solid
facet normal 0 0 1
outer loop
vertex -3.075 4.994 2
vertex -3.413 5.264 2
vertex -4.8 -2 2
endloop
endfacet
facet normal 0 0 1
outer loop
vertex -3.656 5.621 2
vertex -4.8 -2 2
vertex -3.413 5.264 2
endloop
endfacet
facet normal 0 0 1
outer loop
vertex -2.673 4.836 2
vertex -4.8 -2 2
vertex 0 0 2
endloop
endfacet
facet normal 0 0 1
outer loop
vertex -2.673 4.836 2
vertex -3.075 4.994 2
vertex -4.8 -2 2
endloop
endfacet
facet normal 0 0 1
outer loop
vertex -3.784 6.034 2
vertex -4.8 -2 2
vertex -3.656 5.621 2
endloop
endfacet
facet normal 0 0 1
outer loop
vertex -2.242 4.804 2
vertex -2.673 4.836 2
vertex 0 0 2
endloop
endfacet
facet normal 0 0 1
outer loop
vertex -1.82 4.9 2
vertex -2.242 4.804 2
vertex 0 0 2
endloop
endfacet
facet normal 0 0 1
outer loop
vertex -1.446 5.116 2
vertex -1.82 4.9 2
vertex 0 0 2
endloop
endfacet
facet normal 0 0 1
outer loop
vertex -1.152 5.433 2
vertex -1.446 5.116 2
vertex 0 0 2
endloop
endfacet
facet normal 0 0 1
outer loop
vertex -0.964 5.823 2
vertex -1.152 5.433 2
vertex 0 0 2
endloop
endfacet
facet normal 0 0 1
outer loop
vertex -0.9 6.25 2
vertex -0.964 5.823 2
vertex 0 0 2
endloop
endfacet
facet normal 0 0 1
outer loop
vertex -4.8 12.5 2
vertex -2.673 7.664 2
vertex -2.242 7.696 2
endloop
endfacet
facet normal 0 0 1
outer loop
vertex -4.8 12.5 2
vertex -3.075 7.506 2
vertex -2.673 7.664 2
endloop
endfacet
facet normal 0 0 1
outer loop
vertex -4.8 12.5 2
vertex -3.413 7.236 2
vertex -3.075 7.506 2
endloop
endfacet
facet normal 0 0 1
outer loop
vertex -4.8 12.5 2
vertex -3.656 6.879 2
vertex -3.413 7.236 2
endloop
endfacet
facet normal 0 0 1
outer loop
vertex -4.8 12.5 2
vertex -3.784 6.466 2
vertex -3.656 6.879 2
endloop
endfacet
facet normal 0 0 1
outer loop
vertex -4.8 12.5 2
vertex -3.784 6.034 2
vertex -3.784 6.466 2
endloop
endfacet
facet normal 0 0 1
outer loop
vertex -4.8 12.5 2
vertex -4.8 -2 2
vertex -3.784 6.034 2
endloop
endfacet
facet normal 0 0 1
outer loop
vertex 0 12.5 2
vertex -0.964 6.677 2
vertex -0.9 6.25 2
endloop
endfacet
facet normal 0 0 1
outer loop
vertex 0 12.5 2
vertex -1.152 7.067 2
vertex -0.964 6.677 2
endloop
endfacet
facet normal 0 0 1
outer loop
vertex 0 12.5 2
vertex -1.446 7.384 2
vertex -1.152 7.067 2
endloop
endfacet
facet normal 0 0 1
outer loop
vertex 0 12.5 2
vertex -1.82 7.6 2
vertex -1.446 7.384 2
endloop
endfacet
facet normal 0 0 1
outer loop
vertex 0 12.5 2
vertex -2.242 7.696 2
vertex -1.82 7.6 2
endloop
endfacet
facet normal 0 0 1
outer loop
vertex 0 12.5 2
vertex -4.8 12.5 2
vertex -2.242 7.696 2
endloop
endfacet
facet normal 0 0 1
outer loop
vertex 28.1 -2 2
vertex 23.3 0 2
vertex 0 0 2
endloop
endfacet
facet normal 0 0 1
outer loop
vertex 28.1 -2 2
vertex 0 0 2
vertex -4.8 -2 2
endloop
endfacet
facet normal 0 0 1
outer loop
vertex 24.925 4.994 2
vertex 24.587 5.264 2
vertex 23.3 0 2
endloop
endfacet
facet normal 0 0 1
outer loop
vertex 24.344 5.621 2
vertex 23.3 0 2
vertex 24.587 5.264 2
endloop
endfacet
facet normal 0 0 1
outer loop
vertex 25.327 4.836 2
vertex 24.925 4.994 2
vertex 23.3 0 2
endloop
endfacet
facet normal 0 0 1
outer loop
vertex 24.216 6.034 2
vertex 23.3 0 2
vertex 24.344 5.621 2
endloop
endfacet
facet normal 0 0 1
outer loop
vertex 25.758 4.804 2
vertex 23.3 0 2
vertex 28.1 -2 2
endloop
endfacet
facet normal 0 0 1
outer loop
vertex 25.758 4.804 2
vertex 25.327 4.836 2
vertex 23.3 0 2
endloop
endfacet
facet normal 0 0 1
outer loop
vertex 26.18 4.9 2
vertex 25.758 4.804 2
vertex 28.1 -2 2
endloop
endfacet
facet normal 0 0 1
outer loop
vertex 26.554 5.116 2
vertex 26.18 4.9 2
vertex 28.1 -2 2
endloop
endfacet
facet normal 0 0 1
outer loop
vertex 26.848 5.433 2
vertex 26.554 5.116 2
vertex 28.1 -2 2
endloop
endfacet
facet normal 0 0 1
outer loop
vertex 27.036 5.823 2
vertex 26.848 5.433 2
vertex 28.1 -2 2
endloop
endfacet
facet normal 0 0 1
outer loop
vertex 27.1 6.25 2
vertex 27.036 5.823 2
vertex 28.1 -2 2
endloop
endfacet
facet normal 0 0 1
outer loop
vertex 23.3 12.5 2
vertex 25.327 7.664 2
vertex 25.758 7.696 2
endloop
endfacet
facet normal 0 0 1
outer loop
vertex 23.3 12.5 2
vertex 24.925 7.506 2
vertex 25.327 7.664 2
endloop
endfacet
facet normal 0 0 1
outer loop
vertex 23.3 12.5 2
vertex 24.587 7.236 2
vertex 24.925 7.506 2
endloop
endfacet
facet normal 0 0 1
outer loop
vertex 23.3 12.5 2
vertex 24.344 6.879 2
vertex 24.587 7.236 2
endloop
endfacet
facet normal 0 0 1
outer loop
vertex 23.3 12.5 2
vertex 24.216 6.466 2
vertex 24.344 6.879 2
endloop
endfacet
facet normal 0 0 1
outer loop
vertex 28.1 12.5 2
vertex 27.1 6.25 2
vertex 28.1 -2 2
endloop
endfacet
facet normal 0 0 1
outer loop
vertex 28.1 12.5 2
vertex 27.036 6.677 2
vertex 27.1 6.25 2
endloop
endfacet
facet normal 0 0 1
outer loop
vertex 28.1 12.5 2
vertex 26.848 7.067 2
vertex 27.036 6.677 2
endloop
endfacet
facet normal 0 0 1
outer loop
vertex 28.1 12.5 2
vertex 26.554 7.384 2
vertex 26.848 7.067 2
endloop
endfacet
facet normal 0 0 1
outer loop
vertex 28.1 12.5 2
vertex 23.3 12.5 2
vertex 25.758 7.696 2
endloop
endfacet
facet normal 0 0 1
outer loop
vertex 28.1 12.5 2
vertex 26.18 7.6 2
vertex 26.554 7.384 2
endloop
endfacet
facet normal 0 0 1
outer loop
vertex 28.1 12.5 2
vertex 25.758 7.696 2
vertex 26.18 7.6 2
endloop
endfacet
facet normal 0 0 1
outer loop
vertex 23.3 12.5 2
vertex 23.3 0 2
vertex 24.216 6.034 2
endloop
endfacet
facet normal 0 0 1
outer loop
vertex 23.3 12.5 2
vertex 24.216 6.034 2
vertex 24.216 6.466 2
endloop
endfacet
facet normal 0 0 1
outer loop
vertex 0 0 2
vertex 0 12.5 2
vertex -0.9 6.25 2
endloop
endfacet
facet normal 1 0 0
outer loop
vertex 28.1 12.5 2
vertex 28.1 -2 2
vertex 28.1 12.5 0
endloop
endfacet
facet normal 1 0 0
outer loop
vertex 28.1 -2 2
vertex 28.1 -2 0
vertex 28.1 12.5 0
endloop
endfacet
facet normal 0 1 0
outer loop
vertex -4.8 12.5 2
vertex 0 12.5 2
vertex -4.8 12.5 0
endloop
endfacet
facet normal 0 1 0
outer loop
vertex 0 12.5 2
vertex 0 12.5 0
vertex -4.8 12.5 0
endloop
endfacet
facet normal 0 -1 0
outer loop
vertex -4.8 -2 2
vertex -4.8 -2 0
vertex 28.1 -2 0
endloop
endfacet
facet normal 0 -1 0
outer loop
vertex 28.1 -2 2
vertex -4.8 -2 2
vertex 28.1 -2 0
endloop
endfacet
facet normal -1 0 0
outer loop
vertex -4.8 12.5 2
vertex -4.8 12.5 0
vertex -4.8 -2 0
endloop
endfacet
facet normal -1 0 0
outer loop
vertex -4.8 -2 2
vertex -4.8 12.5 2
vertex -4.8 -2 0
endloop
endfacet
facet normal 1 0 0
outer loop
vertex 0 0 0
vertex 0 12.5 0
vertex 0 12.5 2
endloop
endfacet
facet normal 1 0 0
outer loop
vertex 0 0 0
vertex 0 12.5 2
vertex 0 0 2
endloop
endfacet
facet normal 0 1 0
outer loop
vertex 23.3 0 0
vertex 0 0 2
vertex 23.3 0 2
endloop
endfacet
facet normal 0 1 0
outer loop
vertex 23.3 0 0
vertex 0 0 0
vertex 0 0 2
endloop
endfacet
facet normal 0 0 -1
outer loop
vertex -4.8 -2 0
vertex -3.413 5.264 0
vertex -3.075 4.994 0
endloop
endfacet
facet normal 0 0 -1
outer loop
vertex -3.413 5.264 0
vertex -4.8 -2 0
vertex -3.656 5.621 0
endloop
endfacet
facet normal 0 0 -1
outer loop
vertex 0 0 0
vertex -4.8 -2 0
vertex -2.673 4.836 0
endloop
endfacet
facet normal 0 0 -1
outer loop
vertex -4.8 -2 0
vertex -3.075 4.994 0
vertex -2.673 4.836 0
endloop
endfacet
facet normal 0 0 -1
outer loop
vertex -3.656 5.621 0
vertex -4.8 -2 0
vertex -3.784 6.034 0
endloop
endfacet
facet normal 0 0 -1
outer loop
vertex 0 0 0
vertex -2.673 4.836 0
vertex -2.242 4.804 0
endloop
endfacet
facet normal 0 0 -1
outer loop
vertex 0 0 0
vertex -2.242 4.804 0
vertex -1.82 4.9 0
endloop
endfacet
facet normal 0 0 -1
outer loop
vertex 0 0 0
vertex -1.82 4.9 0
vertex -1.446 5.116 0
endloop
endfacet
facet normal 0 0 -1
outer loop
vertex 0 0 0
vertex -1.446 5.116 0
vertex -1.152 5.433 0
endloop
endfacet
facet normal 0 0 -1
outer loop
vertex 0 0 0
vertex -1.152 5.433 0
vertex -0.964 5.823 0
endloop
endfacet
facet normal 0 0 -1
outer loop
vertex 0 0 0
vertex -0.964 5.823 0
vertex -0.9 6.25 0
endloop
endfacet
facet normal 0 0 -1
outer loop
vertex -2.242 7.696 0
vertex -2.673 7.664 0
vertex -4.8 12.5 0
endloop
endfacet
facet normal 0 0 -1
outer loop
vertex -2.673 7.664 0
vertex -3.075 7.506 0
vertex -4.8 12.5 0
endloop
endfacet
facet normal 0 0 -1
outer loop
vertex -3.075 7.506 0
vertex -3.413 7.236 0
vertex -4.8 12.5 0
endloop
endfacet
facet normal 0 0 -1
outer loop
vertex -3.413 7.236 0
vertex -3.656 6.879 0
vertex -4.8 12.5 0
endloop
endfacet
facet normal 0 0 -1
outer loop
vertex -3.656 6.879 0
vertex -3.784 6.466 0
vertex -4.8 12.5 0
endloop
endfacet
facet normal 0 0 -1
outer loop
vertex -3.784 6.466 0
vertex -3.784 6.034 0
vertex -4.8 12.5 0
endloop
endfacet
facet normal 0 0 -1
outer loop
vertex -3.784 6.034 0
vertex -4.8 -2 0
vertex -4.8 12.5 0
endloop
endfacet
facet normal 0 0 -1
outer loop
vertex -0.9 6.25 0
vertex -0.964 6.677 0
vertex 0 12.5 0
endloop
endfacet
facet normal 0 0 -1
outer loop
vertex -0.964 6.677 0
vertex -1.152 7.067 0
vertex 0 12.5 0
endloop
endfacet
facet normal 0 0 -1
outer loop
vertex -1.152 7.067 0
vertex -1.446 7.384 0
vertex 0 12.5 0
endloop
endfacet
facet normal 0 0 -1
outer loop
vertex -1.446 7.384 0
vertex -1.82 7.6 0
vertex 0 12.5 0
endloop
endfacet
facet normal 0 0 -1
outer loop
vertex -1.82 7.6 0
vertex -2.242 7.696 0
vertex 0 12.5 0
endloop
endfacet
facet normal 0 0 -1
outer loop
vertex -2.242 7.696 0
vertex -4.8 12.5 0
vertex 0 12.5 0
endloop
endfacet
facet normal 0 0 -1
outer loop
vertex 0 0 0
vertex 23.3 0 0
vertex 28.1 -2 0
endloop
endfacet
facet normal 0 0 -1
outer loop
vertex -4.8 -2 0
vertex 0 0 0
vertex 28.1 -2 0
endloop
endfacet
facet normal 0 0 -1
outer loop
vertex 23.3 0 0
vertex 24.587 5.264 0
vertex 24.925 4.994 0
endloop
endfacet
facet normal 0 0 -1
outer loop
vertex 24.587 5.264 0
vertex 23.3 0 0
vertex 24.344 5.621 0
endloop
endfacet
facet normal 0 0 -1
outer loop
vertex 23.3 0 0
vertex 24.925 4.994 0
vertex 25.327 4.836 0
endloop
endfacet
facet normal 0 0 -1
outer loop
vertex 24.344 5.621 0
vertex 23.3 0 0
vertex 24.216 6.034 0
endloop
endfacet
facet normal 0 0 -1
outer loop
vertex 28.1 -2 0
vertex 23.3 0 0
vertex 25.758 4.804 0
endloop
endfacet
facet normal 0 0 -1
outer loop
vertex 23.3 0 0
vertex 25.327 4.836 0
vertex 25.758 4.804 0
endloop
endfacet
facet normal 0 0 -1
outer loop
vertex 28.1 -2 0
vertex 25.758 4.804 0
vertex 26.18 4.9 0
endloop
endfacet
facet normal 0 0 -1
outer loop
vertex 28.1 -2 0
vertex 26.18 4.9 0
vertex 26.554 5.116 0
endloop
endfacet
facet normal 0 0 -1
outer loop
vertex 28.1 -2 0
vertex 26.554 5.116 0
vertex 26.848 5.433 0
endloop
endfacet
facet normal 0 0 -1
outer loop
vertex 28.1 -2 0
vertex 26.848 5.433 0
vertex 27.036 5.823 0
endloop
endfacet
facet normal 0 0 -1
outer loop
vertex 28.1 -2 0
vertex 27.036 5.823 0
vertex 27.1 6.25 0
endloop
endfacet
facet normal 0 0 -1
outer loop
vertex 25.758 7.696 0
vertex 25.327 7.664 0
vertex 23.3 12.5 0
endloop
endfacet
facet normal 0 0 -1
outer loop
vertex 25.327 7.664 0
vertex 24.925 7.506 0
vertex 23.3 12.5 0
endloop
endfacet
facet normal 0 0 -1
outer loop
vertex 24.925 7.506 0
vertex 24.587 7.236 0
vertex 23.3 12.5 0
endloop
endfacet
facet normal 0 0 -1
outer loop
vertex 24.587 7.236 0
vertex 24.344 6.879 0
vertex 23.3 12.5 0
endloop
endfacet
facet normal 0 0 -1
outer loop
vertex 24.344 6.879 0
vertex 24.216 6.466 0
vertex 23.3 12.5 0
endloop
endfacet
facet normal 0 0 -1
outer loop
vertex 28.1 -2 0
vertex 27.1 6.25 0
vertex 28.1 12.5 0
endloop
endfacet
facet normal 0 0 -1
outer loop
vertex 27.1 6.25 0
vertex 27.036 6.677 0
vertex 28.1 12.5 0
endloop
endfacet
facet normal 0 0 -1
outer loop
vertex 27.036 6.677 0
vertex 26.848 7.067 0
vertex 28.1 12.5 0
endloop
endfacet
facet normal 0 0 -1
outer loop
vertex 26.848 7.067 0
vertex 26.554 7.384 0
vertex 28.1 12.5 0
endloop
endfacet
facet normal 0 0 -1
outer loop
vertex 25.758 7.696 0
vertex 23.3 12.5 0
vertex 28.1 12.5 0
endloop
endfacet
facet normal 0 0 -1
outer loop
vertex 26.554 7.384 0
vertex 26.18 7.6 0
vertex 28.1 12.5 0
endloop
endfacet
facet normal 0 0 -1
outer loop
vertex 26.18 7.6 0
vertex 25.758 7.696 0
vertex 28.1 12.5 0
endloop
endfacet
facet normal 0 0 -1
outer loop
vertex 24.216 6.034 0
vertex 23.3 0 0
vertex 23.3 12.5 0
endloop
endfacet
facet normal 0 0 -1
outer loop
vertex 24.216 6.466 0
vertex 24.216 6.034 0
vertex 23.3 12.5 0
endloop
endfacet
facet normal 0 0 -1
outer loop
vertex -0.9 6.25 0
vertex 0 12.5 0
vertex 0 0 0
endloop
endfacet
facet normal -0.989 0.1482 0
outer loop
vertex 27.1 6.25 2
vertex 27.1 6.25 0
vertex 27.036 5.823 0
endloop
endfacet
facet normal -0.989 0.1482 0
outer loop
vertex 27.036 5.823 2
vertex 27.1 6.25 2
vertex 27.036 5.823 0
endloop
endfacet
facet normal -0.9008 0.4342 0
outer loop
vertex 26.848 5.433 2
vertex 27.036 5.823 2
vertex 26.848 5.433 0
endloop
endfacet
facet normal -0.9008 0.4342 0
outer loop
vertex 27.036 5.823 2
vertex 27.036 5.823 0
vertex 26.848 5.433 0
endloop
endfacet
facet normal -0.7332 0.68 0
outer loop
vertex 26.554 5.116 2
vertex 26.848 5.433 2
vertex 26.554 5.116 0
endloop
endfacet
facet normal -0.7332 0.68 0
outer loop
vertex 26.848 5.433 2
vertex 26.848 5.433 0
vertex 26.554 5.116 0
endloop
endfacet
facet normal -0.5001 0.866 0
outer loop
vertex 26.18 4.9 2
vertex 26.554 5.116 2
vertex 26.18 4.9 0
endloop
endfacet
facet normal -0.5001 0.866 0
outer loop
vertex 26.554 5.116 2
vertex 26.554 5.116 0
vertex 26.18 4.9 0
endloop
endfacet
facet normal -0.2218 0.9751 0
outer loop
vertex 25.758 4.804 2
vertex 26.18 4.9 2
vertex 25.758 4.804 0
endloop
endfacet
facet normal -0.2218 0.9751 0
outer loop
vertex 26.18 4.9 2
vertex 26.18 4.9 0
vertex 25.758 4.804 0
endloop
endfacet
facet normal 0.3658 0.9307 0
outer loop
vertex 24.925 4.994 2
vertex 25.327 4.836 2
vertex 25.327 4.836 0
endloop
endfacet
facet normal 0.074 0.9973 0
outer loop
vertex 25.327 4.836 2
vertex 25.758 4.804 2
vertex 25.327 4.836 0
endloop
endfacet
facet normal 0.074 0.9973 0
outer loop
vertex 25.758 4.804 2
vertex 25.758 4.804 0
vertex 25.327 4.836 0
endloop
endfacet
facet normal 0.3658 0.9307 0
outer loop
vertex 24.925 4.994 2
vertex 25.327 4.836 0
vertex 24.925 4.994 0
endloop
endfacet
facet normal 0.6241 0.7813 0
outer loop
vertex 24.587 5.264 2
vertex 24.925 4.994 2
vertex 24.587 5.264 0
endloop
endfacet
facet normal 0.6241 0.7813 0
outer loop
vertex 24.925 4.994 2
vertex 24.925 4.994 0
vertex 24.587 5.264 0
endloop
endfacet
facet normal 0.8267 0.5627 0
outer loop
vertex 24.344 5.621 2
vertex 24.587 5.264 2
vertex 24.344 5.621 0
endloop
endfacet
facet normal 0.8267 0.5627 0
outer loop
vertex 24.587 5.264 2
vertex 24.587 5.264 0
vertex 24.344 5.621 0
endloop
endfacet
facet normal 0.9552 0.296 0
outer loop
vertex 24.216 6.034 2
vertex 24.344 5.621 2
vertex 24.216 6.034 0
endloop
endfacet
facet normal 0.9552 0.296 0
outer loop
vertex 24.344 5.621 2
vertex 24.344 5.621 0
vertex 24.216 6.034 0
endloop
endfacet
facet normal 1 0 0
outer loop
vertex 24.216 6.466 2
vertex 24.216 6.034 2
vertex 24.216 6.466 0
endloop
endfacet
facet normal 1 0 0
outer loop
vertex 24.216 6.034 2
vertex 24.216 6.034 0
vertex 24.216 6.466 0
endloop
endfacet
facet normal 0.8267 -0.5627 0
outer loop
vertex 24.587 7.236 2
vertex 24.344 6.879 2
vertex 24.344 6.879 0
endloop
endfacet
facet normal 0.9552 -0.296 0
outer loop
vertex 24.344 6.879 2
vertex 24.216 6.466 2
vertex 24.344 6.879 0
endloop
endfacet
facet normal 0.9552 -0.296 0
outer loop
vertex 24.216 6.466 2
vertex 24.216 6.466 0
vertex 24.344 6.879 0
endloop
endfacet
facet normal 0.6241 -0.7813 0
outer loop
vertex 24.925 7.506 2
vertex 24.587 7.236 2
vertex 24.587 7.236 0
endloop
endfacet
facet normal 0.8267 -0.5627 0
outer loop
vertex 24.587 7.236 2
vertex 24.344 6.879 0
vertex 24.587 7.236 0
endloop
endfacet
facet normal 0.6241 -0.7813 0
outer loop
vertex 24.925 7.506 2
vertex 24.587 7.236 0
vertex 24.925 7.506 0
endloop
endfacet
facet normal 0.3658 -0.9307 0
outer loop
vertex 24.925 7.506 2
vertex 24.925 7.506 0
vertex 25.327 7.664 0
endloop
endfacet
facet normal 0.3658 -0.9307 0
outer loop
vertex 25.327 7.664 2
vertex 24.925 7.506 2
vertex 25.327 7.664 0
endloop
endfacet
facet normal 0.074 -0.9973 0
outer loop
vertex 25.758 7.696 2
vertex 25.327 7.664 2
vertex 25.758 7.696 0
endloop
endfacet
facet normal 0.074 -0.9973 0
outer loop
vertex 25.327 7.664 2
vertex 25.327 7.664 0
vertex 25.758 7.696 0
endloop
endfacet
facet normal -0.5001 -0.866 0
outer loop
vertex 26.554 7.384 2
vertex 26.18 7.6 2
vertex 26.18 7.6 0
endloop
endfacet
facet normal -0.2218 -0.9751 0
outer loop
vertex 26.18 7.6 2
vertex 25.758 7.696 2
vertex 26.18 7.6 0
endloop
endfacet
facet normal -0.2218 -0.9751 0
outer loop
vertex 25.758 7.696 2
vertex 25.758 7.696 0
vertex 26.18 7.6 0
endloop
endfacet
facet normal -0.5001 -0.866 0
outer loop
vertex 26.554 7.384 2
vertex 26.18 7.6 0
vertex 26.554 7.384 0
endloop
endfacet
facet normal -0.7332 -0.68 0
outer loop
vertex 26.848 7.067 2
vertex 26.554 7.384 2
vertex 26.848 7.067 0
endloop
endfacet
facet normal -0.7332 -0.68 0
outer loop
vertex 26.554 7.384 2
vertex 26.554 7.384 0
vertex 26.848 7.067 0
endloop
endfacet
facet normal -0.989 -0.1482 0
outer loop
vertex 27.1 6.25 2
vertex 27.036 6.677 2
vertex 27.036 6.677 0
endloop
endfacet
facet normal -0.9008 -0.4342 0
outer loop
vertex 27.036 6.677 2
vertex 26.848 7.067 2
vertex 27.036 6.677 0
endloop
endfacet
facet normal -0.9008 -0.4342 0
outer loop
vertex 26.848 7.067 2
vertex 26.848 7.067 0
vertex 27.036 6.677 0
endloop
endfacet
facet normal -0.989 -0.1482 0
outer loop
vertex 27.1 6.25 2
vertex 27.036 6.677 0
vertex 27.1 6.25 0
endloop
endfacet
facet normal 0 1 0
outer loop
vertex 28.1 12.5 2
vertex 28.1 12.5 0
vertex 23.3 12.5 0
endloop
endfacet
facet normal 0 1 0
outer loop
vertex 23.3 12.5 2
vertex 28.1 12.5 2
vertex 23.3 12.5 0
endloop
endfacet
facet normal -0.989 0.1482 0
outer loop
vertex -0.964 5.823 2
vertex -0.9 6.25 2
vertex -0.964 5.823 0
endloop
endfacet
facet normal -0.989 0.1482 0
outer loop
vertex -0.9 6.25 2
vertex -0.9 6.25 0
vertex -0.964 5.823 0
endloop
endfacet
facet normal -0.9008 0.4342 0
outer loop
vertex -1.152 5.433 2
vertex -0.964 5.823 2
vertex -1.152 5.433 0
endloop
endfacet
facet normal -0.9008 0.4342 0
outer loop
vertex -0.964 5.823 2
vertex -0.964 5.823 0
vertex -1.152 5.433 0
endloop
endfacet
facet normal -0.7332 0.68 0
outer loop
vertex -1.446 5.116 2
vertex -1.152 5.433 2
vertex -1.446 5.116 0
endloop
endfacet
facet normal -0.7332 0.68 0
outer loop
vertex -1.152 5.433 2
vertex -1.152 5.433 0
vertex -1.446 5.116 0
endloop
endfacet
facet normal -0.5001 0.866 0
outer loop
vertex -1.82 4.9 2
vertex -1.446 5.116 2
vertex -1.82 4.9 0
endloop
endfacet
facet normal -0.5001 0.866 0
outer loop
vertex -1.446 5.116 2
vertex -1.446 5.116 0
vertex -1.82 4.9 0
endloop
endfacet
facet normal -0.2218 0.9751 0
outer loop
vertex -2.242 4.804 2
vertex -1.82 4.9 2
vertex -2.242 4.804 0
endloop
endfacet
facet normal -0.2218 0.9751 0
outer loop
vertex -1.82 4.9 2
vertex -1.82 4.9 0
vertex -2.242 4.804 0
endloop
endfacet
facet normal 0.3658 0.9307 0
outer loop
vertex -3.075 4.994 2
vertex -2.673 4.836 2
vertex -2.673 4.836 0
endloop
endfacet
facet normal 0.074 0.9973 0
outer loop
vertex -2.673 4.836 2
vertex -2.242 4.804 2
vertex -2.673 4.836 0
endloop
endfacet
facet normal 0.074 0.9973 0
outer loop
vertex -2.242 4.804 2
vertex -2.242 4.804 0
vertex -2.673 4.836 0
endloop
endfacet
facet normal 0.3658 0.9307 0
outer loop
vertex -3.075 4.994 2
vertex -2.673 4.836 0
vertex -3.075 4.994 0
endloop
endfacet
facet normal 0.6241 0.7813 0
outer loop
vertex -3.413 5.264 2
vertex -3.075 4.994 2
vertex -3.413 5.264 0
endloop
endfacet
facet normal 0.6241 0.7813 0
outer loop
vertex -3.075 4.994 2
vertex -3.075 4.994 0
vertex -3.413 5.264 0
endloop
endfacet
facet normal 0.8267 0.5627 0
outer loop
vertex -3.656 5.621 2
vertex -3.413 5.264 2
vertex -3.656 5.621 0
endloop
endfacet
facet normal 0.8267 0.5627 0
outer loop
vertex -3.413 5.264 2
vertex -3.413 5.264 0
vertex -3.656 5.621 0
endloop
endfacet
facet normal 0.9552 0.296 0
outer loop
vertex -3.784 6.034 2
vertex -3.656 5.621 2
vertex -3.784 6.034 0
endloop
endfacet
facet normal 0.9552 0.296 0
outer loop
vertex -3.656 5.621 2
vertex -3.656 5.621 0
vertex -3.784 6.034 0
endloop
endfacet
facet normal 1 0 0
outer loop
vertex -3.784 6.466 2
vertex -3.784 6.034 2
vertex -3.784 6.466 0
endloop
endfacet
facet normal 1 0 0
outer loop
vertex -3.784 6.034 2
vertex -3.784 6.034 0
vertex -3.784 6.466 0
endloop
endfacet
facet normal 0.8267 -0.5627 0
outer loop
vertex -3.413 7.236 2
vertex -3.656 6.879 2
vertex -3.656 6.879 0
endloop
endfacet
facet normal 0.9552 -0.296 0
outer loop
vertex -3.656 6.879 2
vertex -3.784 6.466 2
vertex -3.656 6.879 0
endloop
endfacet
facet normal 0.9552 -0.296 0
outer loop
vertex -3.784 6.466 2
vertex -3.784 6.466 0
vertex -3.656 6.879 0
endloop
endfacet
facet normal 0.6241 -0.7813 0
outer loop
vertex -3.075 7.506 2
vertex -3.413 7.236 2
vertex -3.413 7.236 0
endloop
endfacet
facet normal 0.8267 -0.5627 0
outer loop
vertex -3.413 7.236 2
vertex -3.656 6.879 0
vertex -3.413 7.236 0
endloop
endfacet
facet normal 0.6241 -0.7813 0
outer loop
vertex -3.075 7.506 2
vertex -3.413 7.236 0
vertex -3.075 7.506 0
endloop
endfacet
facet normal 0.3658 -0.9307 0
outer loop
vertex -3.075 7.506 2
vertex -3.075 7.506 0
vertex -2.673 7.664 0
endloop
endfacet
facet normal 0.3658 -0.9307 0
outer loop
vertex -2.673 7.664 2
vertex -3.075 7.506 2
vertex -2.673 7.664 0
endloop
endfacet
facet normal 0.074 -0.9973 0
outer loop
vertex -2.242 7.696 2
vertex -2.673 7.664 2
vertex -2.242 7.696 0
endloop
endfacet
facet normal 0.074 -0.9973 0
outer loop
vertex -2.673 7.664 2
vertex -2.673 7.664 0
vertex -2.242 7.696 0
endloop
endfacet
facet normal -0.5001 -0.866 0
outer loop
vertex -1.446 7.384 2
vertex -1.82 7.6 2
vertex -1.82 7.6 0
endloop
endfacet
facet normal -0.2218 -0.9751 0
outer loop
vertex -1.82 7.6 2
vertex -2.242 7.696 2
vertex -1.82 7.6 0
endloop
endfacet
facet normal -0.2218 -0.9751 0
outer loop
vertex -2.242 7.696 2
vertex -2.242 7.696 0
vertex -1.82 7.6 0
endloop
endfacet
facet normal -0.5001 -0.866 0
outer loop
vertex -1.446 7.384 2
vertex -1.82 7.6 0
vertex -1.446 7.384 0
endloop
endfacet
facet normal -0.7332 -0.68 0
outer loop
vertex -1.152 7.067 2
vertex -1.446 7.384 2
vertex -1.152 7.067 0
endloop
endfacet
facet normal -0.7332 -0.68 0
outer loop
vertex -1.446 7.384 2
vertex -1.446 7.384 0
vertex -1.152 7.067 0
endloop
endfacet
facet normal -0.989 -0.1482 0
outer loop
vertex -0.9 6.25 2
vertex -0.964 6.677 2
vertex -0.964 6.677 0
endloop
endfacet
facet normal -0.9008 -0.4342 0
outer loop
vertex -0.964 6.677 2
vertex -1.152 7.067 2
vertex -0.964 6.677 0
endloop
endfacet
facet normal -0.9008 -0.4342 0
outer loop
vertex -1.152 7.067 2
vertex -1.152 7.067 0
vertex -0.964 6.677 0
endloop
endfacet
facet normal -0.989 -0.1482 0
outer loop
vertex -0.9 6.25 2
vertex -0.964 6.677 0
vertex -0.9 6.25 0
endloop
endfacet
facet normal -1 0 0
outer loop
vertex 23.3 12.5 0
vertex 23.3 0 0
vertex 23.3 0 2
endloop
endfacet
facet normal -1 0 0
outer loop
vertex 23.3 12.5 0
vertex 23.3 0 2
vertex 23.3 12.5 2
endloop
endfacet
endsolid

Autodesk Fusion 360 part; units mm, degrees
sketch "Sketch1" plane through (0, 0, 0) normal (0, 0, 1) x (1, 0, 0)
  line L0 (0, 0) -> (23.3, 0)
  line L1 (23.3, 0) -> (23.3, 12.5)
  line L2 (23.3, 12.5) -> (0, 12.5)
  line L3 (0, 12.5) -> (0, 0)
  line L4 (0, 6.25) -> (-2.35, 6.25) construction
  line L5 (23.3, 6.25) -> (25.65, 6.25) construction
  circle A0 centre (-2.35, 6.25) radius 1.45
  circle A1 centre (25.65, 6.25) radius 1.45
  line L6 (-4.8, -2) -> (28.1, -2)
  line L7 (28.1, -2) -> (28.1, 12.5)
  line L8 (28.1, 12.5) -> (-4.8, 12.5)
  line L9 (-4.8, 12.5) -> (-4.8, -2)
  dimension "d1" = 23.3
  dimension "d2" = 12.5
  dimension "d3" = 2.35
  dimension "d4" = 2.35
  dimension "d5" = 2.9
  dimension "d6" = 2.9
  dimension "d7" = 2
  dimension "d8" = 2.45
  dimension "d9" = 2.45
extrude "Extrude1" add sketch "Sketch1" along normal blind 2 contours L0 L1 L3 L6 L7 L8 L9
sketch "Sketch2" plane through (0, 0, 2) normal (0, 0, 1) x (-1, 0, 0)
  circle A0 centre (2.35, -6.25) radius 1.45
  circle A1 centre (-25.65, -6.25) radius 1.45
  line L0 (0, -12.5) -> (4.8, -12.5)
  line L1 (4.8, -12.5) -> (4.8, 2)
  line L2 (4.8, 2) -> (-28.1, 2)
  line L3 (-28.1, 2) -> (-28.1, -12.5)
  line L4 (-28.1, -12.5) -> (-23.3, -12.5)
  line L5 (-23.3, -12.5) -> (-23.3, 0)
  line L6 (-23.3, 0) -> (0, 0)
  line L7 (0, 0) -> (0, -12.5)
